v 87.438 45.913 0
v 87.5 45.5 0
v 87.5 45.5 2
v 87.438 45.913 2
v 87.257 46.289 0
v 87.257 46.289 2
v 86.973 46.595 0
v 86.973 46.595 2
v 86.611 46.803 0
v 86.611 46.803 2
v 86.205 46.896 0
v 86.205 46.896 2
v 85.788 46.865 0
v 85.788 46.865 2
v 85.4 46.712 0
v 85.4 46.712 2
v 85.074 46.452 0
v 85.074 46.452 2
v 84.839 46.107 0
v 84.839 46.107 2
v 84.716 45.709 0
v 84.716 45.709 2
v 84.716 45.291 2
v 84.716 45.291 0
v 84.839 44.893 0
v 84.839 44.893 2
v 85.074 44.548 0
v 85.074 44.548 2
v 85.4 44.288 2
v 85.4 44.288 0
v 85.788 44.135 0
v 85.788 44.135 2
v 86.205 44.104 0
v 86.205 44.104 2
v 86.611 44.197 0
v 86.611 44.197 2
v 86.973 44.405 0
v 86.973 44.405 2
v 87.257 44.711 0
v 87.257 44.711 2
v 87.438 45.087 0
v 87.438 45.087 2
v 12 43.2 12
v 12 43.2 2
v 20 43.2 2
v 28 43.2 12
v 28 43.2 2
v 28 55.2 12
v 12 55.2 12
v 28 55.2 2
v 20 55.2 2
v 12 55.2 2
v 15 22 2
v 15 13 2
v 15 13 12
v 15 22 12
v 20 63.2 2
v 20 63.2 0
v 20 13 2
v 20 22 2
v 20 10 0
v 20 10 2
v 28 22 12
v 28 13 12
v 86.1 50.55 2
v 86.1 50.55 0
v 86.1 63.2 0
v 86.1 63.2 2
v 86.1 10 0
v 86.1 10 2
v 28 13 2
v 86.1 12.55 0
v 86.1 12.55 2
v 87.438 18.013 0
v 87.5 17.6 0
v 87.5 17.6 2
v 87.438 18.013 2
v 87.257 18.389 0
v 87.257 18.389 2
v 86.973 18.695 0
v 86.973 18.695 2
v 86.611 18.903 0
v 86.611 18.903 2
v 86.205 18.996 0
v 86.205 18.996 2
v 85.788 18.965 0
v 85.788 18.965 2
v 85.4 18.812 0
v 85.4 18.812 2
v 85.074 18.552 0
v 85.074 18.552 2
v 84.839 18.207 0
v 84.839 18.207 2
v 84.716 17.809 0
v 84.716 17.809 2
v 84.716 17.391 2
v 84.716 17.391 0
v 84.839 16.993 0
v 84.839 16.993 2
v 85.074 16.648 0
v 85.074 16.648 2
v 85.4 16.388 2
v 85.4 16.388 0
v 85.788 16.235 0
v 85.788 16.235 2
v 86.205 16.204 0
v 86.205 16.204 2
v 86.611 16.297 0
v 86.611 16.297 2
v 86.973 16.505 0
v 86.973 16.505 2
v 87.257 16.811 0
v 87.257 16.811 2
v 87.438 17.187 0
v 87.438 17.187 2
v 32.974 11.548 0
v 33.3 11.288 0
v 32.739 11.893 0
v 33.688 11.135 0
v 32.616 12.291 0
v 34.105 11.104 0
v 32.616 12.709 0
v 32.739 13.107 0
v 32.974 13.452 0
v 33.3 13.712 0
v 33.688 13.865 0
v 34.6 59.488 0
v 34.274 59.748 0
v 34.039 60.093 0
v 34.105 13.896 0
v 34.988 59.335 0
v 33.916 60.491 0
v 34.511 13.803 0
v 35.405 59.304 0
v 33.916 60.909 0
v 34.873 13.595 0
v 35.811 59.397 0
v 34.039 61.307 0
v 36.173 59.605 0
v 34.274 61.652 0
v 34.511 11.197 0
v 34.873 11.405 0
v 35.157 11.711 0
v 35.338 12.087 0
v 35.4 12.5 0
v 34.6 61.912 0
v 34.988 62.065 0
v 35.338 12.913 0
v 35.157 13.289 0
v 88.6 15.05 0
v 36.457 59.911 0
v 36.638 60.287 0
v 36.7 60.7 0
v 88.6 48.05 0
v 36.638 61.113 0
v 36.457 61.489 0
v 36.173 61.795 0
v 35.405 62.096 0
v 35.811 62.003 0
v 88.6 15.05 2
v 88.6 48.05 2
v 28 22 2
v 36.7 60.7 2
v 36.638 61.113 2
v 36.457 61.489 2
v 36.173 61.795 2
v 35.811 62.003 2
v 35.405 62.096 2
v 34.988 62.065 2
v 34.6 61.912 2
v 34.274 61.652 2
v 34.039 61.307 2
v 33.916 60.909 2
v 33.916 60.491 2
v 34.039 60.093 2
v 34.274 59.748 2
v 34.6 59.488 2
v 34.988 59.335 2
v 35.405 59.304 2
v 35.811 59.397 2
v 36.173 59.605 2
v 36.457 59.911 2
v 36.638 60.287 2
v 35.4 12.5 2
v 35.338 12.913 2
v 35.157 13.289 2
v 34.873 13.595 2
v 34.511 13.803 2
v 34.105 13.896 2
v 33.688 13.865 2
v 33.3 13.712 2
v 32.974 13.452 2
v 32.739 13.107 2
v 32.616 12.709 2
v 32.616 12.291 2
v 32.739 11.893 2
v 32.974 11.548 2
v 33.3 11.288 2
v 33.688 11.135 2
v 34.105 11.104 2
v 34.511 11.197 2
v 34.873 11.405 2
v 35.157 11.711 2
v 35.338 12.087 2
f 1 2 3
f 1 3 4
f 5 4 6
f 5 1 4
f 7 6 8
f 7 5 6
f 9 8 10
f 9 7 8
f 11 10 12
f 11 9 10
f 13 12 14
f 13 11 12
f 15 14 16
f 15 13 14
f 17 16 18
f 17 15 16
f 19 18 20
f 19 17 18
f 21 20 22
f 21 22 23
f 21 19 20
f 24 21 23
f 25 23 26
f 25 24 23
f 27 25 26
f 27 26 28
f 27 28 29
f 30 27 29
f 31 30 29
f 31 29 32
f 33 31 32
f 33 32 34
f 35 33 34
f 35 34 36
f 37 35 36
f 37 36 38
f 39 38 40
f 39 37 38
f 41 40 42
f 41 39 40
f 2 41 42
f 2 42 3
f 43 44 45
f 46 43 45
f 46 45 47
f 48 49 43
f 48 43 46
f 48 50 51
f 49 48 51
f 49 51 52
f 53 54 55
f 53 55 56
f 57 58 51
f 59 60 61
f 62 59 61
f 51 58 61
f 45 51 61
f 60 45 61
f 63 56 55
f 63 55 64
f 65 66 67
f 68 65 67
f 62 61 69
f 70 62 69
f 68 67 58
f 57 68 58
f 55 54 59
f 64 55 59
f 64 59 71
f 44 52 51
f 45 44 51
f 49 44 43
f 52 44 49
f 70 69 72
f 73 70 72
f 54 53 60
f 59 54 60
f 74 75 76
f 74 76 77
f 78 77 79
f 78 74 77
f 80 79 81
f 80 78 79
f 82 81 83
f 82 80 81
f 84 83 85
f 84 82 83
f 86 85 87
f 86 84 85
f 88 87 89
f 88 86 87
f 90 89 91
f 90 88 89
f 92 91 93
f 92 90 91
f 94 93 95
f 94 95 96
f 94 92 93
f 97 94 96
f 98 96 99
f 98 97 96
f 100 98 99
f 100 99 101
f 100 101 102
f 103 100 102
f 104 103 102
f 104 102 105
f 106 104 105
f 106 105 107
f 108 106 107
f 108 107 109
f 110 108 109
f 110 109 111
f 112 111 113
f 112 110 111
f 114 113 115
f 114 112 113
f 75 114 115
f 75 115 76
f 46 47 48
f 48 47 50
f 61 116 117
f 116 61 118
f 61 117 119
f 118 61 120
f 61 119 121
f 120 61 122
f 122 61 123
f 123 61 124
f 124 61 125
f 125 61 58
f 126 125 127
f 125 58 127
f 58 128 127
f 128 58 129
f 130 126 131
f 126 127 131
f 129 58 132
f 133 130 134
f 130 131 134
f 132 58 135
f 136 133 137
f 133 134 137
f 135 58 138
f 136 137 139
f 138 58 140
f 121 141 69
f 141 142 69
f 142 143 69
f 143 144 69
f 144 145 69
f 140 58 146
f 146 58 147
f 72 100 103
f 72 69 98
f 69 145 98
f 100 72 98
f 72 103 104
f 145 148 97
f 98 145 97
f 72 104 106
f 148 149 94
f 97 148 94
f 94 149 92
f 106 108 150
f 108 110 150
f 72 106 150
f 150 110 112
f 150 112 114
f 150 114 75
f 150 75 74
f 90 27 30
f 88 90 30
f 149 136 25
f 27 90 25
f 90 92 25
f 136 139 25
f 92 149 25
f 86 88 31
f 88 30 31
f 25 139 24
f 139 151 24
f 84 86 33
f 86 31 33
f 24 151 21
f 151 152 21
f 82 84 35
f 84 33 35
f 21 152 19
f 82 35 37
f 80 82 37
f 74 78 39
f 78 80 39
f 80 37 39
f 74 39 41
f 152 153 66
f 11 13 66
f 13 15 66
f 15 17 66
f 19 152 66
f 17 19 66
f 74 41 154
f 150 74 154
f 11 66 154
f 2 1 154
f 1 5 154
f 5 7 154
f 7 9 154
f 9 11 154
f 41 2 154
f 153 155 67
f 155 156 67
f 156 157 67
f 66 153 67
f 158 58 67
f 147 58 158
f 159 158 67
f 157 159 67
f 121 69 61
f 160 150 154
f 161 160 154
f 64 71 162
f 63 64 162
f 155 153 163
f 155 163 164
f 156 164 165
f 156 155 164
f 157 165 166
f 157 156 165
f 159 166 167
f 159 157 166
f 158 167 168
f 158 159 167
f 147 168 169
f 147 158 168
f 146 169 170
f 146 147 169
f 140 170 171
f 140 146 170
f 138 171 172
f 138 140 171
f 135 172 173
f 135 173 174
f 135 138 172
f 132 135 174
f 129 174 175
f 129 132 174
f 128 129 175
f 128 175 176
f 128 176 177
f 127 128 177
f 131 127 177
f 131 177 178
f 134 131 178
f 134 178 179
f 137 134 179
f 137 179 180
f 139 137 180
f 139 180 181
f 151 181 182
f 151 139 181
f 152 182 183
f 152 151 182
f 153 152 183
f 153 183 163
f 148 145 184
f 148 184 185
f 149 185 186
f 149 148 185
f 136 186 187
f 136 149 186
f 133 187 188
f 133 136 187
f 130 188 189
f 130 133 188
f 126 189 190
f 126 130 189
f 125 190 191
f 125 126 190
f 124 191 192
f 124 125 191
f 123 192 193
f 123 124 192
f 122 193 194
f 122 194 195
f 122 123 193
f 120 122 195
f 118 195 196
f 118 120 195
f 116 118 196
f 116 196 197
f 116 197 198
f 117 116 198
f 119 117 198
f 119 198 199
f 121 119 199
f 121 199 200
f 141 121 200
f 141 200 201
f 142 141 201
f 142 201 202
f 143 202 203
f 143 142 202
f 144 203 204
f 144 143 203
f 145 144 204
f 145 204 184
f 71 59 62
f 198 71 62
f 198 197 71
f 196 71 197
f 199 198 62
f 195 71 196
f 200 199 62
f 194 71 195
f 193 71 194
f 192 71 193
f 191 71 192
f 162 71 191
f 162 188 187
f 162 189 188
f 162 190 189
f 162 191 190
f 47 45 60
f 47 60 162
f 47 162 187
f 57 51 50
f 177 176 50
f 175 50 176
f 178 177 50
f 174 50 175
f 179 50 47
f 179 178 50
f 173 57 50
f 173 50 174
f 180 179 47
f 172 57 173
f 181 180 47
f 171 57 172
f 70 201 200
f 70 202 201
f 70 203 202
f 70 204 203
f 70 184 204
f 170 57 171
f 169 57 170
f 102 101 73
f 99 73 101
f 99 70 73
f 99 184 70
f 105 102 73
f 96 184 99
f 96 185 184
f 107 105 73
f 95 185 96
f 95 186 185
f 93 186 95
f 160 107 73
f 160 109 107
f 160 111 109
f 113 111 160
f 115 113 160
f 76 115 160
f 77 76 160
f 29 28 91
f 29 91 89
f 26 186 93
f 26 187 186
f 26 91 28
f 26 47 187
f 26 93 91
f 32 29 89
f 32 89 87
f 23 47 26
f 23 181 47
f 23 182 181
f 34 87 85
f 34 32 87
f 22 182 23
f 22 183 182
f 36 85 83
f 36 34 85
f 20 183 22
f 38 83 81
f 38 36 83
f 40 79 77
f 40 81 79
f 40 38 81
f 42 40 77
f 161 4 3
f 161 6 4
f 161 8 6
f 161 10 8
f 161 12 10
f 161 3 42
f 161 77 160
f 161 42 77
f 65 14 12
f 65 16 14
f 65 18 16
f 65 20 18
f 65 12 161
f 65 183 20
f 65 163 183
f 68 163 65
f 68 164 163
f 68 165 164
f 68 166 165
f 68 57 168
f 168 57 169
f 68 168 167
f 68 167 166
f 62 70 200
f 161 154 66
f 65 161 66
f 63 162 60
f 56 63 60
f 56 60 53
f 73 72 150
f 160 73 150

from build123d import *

# Parameters (mm, degrees)
F0_R     = 1.4
F1_DEPTH = 2
F2_W     = 8
F2_H     = 12
F2_W_2   = 5
F2_H_2   = 9
F3_DEPTH = 10


with BuildPart() as f1:
    # F0 (on Top) → F1 (new body)
    with BuildSketch(Plane.XY):
        Polygon((86.1, 63.2), (20, 63.2), (20, 10), (86.1, 10), (86.1, 12.55), (88.6, 15.05), (88.6, 48.05), (86.1, 50.55), align=None)
        with Locations((34, 12.5)):
            Circle(F0_R, mode=Mode.SUBTRACT)
        with Locations((86.1, 17.6)):
            Circle(F0_R, mode=Mode.SUBTRACT)
        with Locations((35.3, 60.7)):
            Circle(F0_R, mode=Mode.SUBTRACT)
        with Locations((86.1, 45.5)):
            Circle(F0_R, mode=Mode.SUBTRACT)
    extrude(amount=F1_DEPTH)

    # F2 (on face) → F3 (join)
    with BuildSketch(Plane.XY.offset(2)):
        with Locations((16, 49.2)):
            Rectangle(F2_W, F2_H)
        with Locations((24, 49.2)):
            Rectangle(F2_W, F2_H)
        with Locations((17.5, 17.5)):
            Rectangle(F2_W_2, F2_H_2)
        with Locations((24, 17.5)):
            Rectangle(F2_W, F2_H_2)
    extrude(amount=F3_DEPTH)


solid = f1.part
